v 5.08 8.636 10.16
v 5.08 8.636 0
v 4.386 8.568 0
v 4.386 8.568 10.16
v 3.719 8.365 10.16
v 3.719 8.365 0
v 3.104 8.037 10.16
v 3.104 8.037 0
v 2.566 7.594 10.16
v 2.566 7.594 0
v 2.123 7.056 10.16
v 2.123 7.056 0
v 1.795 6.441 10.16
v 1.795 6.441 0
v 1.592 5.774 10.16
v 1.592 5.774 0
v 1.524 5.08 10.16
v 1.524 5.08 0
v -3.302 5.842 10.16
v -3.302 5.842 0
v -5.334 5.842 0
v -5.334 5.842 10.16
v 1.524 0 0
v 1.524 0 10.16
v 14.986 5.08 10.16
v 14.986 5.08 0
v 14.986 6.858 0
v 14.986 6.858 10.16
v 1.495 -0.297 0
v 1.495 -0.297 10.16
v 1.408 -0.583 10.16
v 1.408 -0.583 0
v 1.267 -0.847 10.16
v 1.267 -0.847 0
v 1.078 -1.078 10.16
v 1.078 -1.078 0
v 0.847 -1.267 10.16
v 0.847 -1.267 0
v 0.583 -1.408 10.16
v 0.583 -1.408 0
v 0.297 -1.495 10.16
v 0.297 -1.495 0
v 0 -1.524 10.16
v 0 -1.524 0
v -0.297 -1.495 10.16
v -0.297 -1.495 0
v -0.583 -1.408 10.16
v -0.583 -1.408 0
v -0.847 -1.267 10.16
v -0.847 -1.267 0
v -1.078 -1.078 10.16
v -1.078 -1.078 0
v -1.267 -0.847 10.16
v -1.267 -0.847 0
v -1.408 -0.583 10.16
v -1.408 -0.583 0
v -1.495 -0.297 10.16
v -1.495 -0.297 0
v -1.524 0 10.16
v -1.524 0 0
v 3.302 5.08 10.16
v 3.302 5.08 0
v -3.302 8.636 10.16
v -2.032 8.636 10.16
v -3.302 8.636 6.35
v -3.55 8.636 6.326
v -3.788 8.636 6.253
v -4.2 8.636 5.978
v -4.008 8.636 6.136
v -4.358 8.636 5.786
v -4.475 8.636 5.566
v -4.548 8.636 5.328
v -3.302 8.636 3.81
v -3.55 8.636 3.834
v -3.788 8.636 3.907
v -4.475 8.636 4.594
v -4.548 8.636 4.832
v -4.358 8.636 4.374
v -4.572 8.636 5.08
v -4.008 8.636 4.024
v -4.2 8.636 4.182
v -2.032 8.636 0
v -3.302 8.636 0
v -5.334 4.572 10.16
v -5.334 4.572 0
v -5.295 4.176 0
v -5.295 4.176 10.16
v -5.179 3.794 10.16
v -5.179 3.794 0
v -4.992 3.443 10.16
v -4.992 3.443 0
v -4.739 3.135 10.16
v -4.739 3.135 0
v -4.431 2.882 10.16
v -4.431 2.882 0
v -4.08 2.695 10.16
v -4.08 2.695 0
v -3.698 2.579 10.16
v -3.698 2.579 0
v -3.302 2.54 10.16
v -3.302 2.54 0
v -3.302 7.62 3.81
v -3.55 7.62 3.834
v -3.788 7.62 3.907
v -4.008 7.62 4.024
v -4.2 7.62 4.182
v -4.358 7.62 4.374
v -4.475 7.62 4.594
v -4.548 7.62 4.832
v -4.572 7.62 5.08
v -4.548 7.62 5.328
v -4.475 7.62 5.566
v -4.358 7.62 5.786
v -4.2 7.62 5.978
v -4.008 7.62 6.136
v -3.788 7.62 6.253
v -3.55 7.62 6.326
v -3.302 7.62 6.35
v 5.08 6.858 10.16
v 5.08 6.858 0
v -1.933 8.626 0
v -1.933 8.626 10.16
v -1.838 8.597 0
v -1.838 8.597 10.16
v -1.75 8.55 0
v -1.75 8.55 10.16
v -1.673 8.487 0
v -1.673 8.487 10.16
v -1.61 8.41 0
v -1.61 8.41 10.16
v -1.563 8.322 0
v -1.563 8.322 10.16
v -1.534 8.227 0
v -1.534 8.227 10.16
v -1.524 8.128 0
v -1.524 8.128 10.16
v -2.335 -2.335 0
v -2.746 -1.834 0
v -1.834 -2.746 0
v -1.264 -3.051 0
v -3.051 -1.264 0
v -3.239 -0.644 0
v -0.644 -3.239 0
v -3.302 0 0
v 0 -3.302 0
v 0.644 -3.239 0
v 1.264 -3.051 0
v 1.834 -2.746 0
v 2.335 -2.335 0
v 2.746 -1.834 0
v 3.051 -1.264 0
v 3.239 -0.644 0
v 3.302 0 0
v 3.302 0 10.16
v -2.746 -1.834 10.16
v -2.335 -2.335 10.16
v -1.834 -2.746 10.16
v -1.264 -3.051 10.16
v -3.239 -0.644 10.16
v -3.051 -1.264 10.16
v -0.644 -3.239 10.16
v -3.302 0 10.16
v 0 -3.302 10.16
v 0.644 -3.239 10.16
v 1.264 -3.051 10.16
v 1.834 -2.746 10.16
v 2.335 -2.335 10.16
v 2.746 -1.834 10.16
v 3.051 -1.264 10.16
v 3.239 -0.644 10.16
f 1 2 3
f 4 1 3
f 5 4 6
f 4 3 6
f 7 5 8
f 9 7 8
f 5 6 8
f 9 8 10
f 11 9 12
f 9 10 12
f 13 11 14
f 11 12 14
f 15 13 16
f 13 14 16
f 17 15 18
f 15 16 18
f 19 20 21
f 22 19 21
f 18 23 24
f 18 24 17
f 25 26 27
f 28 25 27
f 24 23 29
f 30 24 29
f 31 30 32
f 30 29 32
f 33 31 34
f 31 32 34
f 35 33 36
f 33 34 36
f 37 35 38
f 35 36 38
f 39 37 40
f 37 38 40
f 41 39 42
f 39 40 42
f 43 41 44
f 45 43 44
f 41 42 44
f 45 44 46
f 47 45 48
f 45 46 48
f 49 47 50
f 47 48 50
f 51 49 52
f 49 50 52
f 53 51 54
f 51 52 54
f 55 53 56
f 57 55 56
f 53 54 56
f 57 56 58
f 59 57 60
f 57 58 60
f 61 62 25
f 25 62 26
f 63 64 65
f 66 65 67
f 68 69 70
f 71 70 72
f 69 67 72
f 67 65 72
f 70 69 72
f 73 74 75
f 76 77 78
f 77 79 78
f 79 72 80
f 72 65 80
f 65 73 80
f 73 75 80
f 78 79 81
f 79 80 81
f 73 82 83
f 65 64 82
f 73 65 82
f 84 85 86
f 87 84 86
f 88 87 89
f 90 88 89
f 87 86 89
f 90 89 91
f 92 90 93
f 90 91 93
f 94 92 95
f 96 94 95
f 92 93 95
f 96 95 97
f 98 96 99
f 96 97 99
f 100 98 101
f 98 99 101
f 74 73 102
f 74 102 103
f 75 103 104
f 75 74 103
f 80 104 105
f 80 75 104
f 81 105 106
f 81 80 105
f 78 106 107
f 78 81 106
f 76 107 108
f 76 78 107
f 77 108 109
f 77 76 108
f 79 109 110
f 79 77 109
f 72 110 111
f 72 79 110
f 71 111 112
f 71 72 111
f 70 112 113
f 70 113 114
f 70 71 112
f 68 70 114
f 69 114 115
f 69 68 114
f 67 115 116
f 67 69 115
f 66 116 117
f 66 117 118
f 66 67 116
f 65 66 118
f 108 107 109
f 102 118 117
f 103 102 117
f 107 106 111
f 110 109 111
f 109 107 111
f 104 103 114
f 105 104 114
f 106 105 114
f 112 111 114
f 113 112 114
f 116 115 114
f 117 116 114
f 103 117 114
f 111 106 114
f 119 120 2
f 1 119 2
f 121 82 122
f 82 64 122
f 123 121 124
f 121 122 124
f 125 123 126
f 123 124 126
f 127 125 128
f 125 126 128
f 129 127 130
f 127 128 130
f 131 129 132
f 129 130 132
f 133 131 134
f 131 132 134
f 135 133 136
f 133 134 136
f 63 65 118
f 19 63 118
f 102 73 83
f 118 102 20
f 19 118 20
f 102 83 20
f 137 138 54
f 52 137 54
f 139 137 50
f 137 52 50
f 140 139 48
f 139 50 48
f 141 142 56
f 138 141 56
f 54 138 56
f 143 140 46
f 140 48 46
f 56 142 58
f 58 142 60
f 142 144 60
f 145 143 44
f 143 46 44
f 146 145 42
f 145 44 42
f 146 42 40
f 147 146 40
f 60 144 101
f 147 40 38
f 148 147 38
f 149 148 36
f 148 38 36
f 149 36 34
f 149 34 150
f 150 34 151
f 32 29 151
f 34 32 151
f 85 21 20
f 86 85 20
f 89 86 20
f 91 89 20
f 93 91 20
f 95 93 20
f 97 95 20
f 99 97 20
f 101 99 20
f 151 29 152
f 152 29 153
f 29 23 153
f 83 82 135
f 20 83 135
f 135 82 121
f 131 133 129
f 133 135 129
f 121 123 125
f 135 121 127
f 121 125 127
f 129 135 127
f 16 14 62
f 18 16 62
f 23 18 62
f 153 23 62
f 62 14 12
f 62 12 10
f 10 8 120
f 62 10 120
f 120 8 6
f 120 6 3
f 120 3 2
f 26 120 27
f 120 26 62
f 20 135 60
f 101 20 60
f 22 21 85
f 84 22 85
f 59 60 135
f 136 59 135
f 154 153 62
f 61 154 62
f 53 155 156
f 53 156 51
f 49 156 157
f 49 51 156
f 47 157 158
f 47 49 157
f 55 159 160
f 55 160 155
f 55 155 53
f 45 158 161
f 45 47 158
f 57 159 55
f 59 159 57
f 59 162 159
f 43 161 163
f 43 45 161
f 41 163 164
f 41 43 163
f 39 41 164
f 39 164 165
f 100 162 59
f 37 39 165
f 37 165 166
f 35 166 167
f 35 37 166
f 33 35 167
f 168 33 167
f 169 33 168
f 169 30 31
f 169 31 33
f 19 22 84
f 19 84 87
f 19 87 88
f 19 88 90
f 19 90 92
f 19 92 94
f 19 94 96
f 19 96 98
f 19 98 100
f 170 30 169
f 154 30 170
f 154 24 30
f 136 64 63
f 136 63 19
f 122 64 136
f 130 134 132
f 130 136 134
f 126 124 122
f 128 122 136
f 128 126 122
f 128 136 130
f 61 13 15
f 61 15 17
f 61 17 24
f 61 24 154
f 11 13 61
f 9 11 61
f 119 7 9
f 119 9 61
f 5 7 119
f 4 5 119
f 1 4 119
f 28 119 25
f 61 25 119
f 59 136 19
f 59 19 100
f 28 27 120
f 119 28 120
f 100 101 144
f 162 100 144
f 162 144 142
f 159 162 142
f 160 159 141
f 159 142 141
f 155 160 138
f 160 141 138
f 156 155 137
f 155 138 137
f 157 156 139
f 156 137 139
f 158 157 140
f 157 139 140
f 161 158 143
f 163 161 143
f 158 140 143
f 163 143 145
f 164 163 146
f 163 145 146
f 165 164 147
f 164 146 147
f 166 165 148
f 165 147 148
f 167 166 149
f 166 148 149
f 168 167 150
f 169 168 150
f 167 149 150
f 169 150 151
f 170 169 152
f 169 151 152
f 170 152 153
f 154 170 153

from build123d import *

# Parameters (mm, degrees)
F0_W     = 1.778
F0_H     = 5.08
F1_DEPTH = 10.16
F3_DEPTH = 1.016
F4_R     = 0.508


with BuildPart() as f1:
    # F0 (on Top) → F1 (new body)
    with BuildSketch(Plane.XY):
        Polygon((-3.302, 5.842), (-3.302, 5.08), (-1.524, 5.08), (-1.524, 8.636), (-3.302, 8.636), align=None)
        Polygon((-1.524, 5.08), (-3.302, 5.08), (-3.302, 4.572), (-3.302, 2.54), (-3.302, 0), (-1.524, 0), align=None)
        Polygon((-3.302, 4.572), (-3.302, 5.08), (-3.302, 5.842), (-5.334, 5.842), (-5.334, 4.572), align=None)
        with BuildLine():
            Line((-3.302, 2.54), (-3.302, 4.572))
            Line((-3.302, 4.572), (-5.334, 4.572))
            ThreePointArc((-5.334, 4.572), (-4.738841, 3.135159), (-3.302, 2.54))
        make_face()
        with BuildLine():
            ThreePointArc((1.524, 0), (0, -1.524), (-1.524, 0))
            Line((-1.524, 0), (-3.302, 0))
            ThreePointArc((-3.302, 0), (0, -3.302), (3.302, 0))
            Line((3.302, 0), (1.524, 0))
        make_face()
        with Locations((2.413, 2.54)):
            Rectangle(F0_W, F0_H)
        with BuildLine():
            ThreePointArc((5.08, 8.636), (2.565528, 7.594472), (1.524, 5.08))
            Line((1.524, 5.08), (3.302, 5.08))
            ThreePointArc((3.302, 5.08), (3.822764, 6.337236), (5.08, 6.858))
            Line((5.08, 6.858), (5.08, 8.636))
        make_face()
        with BuildLine():
            ThreePointArc((5.08, 6.858), (3.822764, 6.337236), (3.302, 5.08))
            Line((3.302, 5.08), (14.986, 5.08))
            Line((14.986, 5.08), (14.986, 6.858))
            Line((14.986, 6.858), (5.08, 6.858))
        make_face()
    extrude(amount=F1_DEPTH)

    # F2 (on face) → F3 (join)
    with BuildSketch(Plane(origin=(0, 8.636, 0), x_dir=(-1, 0, 0), z_dir=(0, 1, 0))):
        with BuildLine():
            Line((3.302, 6.35), (3.302, 3.81))
            ThreePointArc((3.302, 3.81), (4.572, 5.08), (3.302, 6.35))
        make_face()
    extrude(amount=-F3_DEPTH)

    # F4
    f4_edges = [f1.edges().sort_by_distance(p)[0] for p in [
        (-1.524, 8.636, 5.08),
    ]]
    fillet(f4_edges, radius=F4_R)


solid = f1.part
